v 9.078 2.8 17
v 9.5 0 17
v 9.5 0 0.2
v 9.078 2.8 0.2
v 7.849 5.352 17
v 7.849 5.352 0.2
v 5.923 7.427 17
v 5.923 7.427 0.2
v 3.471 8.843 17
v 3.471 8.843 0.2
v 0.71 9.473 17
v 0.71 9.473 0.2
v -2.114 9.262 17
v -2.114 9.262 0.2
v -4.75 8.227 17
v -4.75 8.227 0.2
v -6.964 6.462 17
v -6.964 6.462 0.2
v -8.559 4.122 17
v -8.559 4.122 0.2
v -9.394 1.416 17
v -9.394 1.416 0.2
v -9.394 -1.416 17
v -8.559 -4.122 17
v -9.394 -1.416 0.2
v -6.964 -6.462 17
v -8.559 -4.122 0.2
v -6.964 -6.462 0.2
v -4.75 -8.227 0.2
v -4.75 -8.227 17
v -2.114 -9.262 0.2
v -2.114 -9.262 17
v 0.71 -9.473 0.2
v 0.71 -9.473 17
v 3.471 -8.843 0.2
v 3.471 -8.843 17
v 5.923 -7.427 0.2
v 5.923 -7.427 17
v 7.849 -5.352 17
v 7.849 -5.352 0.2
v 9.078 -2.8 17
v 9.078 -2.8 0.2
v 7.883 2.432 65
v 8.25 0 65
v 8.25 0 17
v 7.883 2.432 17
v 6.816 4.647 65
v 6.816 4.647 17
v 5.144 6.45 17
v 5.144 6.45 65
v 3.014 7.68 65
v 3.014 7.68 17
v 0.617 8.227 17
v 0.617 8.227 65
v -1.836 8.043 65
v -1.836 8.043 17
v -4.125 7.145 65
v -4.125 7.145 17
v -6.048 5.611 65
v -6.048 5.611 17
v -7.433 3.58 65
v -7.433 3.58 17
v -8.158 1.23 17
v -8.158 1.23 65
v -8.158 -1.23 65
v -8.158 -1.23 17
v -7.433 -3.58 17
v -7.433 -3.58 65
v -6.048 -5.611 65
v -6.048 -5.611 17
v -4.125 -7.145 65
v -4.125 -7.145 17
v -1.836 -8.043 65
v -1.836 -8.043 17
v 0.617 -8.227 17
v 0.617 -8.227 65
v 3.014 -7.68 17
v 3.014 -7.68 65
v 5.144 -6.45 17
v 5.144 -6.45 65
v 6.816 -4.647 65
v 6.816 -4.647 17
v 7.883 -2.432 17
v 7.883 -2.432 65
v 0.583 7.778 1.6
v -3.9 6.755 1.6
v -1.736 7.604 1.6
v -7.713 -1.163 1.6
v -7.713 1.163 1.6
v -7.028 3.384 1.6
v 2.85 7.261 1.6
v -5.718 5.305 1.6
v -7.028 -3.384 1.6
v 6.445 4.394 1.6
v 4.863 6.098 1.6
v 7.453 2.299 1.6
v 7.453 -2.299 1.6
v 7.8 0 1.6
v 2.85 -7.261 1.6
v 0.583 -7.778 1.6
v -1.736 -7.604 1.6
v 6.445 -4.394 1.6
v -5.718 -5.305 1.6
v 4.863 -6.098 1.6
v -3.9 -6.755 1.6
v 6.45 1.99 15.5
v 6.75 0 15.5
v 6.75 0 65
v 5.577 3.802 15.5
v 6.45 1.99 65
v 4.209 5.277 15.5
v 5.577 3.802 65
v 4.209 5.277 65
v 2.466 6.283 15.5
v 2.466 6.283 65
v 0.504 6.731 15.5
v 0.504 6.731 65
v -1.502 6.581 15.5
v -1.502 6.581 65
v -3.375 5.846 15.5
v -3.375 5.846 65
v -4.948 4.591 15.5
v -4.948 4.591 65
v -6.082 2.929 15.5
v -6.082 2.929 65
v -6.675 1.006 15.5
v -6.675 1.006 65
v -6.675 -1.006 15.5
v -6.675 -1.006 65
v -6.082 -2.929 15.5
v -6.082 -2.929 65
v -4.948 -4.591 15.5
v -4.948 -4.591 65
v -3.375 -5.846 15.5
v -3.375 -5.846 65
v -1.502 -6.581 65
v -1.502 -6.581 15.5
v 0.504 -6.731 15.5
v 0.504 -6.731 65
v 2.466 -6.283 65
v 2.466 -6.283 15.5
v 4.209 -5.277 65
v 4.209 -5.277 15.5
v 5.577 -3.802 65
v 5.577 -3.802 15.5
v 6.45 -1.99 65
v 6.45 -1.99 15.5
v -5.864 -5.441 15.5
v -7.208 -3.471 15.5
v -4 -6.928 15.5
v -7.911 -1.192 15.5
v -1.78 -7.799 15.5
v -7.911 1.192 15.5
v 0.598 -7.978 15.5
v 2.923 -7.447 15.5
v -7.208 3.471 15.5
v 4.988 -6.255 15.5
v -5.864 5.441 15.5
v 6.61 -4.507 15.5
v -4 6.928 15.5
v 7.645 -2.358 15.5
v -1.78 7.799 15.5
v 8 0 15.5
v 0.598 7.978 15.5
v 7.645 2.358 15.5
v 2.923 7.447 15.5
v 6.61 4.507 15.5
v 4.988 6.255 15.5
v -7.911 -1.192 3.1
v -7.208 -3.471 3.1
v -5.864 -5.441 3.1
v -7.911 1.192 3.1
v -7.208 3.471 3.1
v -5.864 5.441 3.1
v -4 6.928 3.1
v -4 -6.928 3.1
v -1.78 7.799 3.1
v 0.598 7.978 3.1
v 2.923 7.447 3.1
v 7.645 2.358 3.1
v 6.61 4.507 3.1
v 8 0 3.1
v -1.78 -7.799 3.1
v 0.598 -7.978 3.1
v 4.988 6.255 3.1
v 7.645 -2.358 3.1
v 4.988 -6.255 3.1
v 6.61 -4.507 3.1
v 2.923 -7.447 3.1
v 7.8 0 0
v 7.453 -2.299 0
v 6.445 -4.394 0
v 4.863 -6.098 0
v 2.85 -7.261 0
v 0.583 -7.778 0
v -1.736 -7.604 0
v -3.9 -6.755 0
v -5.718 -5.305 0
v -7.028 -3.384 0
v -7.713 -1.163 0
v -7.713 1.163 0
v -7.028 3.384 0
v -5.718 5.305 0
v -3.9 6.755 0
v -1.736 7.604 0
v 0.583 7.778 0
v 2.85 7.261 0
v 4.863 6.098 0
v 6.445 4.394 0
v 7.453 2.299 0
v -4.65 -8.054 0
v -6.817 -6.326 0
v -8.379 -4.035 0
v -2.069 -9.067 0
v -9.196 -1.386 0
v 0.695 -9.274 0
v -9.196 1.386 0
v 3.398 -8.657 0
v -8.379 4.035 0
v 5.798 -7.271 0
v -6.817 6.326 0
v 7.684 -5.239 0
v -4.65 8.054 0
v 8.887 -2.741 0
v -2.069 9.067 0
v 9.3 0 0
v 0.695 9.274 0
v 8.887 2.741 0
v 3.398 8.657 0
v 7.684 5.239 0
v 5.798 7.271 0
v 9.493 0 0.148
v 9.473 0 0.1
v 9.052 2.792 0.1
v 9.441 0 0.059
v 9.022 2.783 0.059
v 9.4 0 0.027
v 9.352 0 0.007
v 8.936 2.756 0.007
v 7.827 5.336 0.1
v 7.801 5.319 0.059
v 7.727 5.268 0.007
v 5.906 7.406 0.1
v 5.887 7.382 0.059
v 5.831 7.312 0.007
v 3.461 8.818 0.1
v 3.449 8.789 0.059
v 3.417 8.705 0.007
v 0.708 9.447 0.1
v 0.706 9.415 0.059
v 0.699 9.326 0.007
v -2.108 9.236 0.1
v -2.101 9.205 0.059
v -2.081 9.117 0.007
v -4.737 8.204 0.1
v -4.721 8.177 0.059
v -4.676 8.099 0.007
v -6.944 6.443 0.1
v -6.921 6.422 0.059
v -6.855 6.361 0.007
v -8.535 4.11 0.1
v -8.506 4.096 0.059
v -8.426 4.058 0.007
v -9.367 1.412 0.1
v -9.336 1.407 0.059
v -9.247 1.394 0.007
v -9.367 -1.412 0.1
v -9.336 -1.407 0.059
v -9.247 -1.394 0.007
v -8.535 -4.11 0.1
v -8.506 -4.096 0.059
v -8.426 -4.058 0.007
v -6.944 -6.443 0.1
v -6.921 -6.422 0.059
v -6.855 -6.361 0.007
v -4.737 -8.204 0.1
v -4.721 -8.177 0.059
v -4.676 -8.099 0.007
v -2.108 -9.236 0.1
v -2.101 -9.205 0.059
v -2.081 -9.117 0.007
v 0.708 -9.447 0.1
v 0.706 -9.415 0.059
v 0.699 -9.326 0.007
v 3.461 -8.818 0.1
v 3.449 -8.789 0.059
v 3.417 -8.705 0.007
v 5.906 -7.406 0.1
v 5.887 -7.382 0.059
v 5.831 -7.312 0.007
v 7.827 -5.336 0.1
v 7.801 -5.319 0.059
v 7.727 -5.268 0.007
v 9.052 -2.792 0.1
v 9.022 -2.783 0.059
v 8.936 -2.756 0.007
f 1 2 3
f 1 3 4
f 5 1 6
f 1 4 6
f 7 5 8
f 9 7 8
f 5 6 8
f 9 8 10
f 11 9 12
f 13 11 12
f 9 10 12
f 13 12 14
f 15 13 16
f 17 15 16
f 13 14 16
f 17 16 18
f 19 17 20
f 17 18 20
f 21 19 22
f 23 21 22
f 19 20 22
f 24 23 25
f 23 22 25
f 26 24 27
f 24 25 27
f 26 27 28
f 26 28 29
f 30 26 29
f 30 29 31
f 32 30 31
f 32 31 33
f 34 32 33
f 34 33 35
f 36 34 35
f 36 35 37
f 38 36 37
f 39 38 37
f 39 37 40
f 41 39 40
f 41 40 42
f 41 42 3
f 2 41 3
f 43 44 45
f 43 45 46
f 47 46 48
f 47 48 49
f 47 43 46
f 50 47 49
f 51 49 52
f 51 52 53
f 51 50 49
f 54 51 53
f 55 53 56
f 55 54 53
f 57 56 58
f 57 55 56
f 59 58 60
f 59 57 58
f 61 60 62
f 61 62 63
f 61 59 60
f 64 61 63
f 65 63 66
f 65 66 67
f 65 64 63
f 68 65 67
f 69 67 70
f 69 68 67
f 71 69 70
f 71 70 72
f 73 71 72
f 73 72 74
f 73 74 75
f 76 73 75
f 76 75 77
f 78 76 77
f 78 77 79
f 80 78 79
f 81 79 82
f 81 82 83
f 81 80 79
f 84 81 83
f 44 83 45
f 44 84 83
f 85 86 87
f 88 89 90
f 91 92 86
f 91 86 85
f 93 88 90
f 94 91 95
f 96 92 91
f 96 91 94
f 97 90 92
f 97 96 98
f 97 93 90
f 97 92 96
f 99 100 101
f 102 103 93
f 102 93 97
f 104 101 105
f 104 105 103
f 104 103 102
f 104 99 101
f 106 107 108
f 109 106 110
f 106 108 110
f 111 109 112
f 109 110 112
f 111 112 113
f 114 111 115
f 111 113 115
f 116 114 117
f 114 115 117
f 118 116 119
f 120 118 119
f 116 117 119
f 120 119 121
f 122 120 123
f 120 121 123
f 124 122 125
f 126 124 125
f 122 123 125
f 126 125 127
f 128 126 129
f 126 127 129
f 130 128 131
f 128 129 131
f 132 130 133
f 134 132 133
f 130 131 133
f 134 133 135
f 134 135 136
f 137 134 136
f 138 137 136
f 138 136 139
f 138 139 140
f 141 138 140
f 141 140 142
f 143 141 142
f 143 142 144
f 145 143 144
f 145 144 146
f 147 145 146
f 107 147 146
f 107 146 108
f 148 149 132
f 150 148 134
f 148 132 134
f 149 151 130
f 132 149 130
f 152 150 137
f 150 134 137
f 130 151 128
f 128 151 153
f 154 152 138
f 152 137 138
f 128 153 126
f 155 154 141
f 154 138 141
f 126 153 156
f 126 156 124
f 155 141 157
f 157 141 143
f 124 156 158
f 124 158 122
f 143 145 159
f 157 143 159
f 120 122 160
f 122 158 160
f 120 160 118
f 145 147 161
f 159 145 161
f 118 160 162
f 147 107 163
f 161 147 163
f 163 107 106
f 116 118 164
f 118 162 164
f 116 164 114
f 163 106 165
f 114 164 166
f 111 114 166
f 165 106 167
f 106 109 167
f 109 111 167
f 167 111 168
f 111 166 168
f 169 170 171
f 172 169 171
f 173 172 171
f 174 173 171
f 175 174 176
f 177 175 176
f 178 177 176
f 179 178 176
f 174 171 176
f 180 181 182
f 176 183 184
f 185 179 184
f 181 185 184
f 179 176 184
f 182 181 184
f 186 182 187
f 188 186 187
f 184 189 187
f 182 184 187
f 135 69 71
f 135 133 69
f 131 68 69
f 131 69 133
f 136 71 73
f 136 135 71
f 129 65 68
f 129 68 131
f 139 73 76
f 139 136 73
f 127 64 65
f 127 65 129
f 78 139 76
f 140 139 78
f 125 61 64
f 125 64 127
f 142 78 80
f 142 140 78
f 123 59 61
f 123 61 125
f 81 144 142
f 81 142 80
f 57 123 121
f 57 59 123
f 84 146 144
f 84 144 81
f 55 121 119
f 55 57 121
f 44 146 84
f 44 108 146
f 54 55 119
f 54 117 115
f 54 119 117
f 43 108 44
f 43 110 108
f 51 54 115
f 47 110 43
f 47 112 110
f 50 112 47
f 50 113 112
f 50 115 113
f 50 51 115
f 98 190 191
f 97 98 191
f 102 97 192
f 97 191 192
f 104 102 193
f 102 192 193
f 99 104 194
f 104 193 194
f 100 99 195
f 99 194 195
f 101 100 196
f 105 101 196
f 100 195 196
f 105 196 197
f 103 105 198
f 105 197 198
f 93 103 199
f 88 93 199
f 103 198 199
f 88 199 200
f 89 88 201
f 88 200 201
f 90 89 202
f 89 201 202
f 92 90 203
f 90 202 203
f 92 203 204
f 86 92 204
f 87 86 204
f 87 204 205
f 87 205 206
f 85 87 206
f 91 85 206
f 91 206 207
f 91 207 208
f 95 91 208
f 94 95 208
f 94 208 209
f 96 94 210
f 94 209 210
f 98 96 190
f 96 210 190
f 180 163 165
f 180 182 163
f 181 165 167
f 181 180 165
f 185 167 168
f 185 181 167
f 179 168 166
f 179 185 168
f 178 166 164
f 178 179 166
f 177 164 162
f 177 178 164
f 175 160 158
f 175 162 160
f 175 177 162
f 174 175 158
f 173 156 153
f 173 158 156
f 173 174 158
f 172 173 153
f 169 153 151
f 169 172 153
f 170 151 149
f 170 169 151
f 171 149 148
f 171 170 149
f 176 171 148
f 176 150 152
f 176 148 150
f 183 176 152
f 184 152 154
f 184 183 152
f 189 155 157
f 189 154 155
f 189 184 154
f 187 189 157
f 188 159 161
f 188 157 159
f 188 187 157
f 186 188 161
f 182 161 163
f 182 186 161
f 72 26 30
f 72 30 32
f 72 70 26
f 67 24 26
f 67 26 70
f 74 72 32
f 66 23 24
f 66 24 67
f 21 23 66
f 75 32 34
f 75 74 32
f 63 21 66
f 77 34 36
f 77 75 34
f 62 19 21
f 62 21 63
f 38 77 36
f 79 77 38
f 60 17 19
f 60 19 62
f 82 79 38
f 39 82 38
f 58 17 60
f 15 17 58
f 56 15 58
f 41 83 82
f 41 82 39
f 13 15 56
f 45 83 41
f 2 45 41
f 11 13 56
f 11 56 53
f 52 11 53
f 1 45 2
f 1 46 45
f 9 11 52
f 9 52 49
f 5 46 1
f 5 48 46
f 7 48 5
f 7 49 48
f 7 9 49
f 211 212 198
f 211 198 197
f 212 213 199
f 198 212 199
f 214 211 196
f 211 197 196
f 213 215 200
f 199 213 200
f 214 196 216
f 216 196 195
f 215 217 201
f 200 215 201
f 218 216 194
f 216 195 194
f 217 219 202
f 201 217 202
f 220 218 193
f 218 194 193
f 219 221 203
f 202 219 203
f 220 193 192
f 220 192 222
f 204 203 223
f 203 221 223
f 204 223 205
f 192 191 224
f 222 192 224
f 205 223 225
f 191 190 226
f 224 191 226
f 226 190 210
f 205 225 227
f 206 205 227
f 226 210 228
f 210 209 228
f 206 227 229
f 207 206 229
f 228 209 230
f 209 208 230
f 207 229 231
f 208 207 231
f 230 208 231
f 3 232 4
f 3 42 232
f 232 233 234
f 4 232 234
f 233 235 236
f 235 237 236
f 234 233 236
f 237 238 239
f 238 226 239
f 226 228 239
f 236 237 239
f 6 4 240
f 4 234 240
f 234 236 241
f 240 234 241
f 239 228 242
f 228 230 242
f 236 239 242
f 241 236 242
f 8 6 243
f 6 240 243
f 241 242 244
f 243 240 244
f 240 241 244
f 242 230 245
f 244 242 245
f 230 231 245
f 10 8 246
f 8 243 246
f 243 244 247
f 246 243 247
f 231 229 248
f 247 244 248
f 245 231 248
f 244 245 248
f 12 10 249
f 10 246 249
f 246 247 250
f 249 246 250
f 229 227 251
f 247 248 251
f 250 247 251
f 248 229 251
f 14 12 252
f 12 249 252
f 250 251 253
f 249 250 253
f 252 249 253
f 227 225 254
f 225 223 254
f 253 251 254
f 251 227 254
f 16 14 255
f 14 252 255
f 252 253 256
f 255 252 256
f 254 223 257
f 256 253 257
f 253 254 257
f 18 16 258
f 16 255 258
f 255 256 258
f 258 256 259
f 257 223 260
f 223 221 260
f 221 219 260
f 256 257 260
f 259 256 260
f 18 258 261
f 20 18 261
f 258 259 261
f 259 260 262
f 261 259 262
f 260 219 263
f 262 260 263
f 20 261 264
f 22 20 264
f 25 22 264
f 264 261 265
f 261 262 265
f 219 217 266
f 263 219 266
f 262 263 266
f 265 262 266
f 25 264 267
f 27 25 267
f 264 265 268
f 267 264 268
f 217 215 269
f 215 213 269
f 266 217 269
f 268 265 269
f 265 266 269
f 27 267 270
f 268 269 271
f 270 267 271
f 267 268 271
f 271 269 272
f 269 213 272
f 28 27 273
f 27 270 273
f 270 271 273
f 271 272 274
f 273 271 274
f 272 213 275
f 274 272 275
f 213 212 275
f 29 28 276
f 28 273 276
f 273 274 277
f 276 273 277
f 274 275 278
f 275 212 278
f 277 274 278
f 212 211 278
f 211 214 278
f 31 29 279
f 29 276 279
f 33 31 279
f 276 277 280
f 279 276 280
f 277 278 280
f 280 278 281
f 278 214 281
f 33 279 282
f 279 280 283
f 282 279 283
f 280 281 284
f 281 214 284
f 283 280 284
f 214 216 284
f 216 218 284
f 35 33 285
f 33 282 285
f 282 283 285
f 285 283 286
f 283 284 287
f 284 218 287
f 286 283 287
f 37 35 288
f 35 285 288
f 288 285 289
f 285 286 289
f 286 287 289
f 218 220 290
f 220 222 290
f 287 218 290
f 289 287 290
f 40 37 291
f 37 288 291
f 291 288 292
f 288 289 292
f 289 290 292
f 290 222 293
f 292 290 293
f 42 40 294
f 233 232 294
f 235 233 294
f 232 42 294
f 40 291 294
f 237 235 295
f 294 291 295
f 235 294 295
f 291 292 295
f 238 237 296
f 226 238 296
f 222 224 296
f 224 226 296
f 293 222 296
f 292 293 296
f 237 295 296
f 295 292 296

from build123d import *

# Parameters (mm, degrees)
F0_R     = 9.5
F1_DEPTH = 65
F2_R     = 0.2
F3_R     = 9.5
F3_R_2   = 8.25
F4_DEPTH = 48
F5_R     = 7.8
F6_DEPTH = 1.6
F7_T     = -1.5


with BuildPart() as f1:
    # F0 (on Top) → F1 (new body)
    with BuildSketch(Plane.XY):
        Circle(F0_R)
    extrude(amount=F1_DEPTH)

    # F2
    f2_edges = [f1.edges().sort_by_distance(p)[0] for p in [
        (-9.5, 0, 0),
    ]]
    fillet(f2_edges, radius=F2_R)

    # F3 (on face) → F4 (cut)
    with BuildSketch(Plane.XY.offset(65)):
        Circle(F3_R)
        Circle(F3_R_2, mode=Mode.SUBTRACT)
    extrude(amount=-F4_DEPTH, mode=Mode.SUBTRACT)

    # F5 (on face) → F6 (cut)
    with BuildSketch(Plane(origin=(0, 0, 0), x_dir=(1, 0, 0), z_dir=(0, 0, -1))):
        Circle(F5_R)
    extrude(amount=-F6_DEPTH, mode=Mode.SUBTRACT)

    # F7
    f7_openings = [f1.faces().sort_by_distance(p)[0] for p in [
        (0, 0, 65),
    ]]
    offset(amount=F7_T, openings=f7_openings, kind=Kind.INTERSECTION)


solid = f1.part
